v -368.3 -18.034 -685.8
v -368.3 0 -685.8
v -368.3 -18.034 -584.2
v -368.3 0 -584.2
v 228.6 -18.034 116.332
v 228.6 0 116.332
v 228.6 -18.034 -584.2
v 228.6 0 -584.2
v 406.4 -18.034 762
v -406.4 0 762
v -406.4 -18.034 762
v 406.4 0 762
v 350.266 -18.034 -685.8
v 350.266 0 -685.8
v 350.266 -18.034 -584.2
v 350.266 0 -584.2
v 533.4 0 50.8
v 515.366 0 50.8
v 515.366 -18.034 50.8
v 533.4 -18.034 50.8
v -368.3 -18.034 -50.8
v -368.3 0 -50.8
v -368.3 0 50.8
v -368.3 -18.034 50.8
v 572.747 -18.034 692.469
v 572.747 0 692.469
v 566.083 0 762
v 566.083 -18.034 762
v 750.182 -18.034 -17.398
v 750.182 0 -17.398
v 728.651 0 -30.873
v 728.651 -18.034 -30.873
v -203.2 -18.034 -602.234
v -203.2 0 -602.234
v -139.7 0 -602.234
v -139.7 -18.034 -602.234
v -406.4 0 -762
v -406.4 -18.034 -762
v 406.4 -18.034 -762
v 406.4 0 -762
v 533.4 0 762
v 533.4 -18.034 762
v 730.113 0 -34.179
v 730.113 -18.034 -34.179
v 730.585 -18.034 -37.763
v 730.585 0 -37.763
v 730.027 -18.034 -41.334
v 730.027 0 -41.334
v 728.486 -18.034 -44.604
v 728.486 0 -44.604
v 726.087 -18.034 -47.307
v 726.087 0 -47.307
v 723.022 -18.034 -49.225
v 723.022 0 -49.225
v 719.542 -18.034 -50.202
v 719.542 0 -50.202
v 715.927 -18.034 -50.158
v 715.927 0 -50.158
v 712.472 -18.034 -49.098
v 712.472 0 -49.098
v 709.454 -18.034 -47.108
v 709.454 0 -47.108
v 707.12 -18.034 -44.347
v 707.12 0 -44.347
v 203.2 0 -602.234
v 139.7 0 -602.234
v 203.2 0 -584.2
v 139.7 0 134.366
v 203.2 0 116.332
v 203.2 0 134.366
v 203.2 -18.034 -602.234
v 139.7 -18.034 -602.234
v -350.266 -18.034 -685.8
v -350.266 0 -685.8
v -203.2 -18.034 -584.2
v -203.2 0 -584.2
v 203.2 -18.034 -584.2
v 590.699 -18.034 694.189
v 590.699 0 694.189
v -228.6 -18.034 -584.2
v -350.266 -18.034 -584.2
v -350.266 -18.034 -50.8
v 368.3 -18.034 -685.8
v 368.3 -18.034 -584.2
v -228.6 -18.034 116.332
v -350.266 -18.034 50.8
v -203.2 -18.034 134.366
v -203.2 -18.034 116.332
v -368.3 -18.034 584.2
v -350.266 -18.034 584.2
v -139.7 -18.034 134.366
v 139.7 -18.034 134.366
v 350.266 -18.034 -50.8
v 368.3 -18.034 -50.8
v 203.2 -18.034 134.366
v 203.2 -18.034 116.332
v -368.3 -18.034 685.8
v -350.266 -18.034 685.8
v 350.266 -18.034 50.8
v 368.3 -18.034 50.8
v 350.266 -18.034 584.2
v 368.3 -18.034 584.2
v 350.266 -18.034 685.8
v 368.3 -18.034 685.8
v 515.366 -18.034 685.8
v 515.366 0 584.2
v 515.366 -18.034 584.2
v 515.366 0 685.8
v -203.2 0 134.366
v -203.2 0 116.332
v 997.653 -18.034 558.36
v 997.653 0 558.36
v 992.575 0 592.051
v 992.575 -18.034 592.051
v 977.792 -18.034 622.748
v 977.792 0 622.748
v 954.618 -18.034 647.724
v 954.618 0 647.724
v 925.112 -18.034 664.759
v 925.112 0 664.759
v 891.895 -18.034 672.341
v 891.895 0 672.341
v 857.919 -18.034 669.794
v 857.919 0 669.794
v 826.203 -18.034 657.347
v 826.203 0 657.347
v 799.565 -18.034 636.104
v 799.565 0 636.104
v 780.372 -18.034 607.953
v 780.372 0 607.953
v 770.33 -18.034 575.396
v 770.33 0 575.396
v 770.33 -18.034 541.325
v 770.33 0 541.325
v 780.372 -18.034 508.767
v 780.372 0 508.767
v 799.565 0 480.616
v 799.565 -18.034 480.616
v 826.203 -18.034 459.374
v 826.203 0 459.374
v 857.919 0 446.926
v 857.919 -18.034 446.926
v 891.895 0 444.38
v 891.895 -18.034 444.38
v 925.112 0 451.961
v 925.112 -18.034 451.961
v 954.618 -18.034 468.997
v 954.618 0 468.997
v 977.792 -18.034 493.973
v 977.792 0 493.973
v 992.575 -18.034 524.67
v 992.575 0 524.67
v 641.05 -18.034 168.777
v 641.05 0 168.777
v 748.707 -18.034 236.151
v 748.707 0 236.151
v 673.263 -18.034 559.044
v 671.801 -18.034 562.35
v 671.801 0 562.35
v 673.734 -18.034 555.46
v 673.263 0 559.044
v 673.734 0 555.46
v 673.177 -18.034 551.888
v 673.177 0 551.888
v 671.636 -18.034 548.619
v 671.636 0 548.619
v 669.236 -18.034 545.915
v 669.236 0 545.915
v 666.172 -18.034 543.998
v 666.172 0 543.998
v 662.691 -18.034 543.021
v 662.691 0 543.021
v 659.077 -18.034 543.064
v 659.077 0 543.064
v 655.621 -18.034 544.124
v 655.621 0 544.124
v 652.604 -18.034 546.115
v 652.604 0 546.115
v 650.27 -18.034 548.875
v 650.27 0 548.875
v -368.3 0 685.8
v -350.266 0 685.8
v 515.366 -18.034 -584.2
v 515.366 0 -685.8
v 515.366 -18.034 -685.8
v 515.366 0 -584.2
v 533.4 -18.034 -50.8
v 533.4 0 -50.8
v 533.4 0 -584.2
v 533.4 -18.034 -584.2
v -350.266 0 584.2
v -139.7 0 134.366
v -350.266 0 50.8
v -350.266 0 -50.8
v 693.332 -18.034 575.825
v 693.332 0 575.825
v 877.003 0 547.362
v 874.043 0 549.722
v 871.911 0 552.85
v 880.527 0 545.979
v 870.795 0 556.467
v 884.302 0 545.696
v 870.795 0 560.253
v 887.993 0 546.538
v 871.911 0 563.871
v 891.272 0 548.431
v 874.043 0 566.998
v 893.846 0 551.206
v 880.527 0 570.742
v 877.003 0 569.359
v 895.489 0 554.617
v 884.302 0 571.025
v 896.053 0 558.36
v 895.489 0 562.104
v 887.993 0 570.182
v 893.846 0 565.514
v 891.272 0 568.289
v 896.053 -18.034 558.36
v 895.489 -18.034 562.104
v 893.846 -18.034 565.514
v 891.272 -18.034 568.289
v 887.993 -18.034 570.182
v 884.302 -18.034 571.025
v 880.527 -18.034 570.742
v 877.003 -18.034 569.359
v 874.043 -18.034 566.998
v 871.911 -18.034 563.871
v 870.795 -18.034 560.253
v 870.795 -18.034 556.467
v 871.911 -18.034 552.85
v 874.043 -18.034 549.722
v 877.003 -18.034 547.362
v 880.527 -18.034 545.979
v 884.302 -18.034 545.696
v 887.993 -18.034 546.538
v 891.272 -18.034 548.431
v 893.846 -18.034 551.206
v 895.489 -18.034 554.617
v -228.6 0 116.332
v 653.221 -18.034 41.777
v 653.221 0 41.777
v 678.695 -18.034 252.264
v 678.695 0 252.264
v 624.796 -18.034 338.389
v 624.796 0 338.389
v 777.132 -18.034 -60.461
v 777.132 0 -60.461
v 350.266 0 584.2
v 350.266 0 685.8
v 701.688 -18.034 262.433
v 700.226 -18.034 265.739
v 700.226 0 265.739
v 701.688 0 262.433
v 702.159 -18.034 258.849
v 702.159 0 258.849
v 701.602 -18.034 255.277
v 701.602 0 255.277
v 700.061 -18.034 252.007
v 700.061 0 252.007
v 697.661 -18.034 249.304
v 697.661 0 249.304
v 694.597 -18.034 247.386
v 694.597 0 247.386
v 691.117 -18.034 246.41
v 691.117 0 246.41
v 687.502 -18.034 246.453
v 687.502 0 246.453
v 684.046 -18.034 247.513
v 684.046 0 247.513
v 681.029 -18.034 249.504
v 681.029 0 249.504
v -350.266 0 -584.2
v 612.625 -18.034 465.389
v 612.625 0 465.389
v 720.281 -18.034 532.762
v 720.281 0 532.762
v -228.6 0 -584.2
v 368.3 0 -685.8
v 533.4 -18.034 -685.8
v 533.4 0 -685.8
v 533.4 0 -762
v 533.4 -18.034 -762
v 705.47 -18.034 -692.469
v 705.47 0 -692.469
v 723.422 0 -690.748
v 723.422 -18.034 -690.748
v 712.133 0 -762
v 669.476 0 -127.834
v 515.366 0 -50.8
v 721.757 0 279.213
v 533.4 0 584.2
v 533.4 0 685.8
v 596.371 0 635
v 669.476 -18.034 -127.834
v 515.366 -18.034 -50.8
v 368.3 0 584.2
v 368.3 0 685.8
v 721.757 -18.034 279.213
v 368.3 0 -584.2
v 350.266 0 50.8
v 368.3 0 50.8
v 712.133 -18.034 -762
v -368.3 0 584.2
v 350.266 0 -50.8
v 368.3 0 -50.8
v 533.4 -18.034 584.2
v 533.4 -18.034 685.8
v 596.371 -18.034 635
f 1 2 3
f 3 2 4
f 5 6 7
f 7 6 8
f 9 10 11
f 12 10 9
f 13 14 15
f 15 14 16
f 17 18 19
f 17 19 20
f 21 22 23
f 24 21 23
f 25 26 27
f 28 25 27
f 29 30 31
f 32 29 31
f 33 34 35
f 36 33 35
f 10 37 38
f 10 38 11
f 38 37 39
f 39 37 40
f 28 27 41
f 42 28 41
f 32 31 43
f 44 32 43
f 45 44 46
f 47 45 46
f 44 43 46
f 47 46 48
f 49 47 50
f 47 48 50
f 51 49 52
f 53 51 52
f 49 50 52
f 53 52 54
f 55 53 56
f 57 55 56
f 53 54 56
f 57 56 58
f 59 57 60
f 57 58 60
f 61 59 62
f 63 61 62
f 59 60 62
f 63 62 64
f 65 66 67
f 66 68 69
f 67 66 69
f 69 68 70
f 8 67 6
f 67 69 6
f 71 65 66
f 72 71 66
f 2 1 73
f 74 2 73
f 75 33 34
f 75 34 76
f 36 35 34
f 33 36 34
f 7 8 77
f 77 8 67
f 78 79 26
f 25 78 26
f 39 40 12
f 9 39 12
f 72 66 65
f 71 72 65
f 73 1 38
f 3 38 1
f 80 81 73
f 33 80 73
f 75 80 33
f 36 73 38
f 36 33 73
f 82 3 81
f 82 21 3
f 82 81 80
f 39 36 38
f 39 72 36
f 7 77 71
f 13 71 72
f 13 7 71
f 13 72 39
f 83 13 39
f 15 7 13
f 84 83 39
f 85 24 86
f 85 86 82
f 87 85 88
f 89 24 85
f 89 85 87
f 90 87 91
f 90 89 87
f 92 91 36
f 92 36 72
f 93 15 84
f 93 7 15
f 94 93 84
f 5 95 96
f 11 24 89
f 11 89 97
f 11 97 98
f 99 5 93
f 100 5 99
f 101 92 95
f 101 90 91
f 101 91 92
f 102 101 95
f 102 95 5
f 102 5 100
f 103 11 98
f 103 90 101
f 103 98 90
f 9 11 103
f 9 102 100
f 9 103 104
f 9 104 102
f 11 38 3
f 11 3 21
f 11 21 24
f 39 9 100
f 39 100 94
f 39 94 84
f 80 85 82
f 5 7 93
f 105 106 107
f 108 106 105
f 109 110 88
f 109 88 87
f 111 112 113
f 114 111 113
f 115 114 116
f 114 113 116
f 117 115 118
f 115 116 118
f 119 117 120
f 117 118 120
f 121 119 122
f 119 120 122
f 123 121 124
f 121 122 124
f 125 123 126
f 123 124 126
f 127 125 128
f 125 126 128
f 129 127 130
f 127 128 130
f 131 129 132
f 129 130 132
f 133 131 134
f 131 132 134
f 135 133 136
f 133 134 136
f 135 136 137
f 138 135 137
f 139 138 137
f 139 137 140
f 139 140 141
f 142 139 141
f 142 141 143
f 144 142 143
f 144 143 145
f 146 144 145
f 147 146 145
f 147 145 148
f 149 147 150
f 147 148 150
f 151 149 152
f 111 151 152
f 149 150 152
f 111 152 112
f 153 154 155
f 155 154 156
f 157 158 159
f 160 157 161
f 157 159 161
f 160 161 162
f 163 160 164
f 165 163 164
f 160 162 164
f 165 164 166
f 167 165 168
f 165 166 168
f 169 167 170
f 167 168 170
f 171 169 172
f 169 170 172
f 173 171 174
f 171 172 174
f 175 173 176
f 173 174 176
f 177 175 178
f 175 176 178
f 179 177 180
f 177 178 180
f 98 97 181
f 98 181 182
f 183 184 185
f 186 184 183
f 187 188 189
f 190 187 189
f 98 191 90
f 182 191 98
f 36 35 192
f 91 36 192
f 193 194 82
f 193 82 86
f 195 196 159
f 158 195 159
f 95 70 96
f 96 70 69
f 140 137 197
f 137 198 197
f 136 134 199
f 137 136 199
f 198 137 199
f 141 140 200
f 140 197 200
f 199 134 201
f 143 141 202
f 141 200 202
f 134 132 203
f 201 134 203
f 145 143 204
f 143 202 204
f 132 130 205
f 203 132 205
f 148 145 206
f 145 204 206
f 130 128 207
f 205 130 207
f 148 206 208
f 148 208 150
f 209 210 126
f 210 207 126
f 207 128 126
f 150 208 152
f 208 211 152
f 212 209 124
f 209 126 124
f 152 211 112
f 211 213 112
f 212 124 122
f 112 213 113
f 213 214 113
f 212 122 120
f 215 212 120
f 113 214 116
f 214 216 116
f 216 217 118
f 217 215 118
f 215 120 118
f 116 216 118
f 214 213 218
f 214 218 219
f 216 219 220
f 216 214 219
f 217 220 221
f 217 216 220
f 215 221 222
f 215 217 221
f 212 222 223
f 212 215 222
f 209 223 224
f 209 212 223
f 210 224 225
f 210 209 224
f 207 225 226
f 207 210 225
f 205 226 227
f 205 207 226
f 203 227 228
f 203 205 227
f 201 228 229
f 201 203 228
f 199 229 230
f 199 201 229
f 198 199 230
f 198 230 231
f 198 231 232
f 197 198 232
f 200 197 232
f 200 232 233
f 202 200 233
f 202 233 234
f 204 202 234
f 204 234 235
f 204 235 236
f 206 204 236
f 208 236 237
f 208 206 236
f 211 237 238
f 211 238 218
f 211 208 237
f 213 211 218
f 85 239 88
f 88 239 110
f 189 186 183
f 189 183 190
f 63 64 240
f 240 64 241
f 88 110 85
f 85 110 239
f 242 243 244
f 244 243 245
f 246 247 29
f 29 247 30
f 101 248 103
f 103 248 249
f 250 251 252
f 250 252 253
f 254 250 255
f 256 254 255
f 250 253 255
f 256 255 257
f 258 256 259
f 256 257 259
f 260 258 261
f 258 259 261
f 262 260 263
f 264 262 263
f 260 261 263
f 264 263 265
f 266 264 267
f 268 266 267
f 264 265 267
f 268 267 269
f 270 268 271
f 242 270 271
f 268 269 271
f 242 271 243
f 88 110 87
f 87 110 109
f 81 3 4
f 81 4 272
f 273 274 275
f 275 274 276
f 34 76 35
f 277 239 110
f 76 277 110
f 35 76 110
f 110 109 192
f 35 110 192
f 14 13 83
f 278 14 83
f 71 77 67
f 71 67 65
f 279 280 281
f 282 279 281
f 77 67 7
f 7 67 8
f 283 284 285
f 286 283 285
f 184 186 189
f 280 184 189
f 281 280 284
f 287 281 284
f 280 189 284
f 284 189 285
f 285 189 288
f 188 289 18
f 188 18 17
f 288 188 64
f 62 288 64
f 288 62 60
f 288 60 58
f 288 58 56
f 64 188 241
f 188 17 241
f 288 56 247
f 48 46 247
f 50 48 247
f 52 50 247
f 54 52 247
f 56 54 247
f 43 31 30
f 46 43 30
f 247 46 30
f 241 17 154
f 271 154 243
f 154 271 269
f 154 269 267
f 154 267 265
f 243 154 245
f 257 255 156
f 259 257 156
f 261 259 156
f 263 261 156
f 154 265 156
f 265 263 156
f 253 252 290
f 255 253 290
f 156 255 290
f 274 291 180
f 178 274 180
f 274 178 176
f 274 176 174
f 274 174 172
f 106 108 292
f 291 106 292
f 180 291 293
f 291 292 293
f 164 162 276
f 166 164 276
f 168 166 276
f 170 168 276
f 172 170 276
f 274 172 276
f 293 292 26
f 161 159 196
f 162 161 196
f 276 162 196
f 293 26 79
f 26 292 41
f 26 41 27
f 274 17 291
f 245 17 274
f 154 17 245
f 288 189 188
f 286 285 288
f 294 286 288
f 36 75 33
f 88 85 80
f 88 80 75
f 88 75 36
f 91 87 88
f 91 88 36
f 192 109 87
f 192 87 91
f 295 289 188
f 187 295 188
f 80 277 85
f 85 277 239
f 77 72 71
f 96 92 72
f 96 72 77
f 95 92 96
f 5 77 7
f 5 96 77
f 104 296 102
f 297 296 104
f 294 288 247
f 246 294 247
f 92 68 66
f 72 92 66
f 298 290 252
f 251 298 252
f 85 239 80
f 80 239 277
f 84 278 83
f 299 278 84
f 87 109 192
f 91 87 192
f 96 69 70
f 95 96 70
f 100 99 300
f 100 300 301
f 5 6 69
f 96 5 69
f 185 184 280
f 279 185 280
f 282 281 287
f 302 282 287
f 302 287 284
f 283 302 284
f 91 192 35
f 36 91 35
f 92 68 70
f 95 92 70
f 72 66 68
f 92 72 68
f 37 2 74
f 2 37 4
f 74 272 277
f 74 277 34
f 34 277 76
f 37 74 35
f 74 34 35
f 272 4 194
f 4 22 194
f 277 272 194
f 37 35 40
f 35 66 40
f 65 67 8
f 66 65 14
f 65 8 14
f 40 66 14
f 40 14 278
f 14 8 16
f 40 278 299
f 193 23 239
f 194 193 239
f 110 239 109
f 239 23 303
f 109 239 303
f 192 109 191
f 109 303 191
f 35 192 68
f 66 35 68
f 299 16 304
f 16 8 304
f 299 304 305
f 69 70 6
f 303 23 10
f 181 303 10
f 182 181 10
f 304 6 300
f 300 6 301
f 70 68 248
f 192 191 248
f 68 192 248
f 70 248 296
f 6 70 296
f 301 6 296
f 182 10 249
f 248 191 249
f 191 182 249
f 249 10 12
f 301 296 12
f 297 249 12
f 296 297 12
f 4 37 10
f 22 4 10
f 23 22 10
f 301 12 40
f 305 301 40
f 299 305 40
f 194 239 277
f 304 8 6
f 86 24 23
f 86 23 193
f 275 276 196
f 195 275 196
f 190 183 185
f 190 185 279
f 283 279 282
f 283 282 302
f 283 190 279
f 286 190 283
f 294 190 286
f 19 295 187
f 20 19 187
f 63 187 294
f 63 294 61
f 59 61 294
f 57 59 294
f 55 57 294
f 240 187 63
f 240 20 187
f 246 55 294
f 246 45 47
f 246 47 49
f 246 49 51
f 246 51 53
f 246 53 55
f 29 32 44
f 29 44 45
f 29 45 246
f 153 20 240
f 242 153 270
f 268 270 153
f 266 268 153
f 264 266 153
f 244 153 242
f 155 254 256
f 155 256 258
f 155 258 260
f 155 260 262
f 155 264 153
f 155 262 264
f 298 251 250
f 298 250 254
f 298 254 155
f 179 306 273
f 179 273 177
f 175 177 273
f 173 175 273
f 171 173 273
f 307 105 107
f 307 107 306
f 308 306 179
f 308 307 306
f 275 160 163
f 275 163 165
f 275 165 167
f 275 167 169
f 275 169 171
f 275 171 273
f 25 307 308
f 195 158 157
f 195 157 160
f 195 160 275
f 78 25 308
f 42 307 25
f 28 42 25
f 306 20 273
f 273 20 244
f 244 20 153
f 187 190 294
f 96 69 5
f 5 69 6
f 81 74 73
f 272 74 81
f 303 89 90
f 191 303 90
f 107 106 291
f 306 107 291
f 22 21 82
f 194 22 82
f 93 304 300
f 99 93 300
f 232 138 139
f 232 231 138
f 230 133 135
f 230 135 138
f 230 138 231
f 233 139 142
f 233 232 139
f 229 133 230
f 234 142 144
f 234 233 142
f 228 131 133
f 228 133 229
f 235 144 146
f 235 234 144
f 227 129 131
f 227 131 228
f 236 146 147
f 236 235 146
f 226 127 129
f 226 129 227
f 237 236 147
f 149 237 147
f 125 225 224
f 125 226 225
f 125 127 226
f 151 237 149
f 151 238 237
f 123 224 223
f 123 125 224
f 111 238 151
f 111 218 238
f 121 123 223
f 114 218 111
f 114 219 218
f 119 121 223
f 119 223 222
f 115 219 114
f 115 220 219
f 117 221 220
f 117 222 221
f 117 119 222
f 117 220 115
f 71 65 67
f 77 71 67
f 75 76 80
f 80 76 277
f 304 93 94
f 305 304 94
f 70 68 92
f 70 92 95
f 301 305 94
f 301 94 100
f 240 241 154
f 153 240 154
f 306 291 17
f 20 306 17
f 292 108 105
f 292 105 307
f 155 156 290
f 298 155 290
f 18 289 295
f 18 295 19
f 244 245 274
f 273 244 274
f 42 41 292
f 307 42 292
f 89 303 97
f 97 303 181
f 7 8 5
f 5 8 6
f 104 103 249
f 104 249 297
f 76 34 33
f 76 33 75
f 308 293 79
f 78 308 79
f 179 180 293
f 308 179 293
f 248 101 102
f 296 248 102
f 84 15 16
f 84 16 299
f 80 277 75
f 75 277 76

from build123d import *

# Parameters (mm, degrees)
F1_W     = 812.8
F1_H     = 1524
F1_W_2   = 18.034
F1_H_2   = 101.6
F2_DEPTH = 18.034
F1_R     = 114.3
F1_R_2   = 12.7
F1_W_3   = 63.5
F1_H_3   = 18.034
F3_DEPTH = 18.034


# Not quite as in the source:
# - a variable given as a bare number and used for a length is read in inches; the dataset says mm whatever the document's units were


with BuildPart() as f2:
    # F1 (on Front) → F2 (new body)
    with BuildSketch(Plane.XZ):
        Rectangle(F1_W, F1_H)
        with Locations((-359.283, -635)):
            Rectangle(F1_W_2, F1_H_2, mode=Mode.SUBTRACT)
        Polygon((-203.2, -584.2), (-228.6, -584.2), (-228.6, 116.332), (-203.2, 116.332), (-203.2, 134.366), (-139.7, 134.366), (-139.7, 116.332), (-139.7, -584.2), (-139.7, -602.234), (-203.2, -602.234), align=None, mode=Mode.SUBTRACT)
        Polygon((139.7, -602.234), (139.7, -584.2), (139.7, 116.332), (139.7, 134.366), (203.2, 134.366), (203.2, 116.332), (228.6, 116.332), (228.6, -584.2), (203.2, -584.2), (203.2, -602.234), align=None, mode=Mode.SUBTRACT)
        with Locations((359.283, -635)):
            Rectangle(F1_W_2, F1_H_2, mode=Mode.SUBTRACT)
        with Locations((-359.283, 0)):
            Rectangle(F1_W_2, F1_H_2, mode=Mode.SUBTRACT)
        with Locations((-359.283, 635)):
            Rectangle(F1_W_2, F1_H_2, mode=Mode.SUBTRACT)
        with Locations((359.283, 0)):
            Rectangle(F1_W_2, F1_H_2, mode=Mode.SUBTRACT)
        with Locations((359.283, 635)):
            Rectangle(F1_W_2, F1_H_2, mode=Mode.SUBTRACT)
    extrude(amount=F2_DEPTH)


with BuildPart() as f2b:
    # F1 (on Front) → F2, piece 2 (new body)
    with BuildSketch(Plane.XZ):
        with Locations((524.383, -635)):
            Rectangle(F1_W_2, F1_H_2)
        with Locations((524.383, 0)):
            Rectangle(F1_W_2, F1_H_2)
        with Locations((524.383, 635)):
            Rectangle(F1_W_2, F1_H_2)
        Polygon((650.269536136, 548.8751497174), (596.3708333333, 635), (607.2071109947, 521.9257983161), align=None)
        with BuildLine():
            Line((650.269536136, 548.8751497174), (607.2071109947, 521.9257983161))
            Line((607.2071109947, 521.9257983161), (612.6252498254, 465.3886974742))
            Line((612.6252498254, 465.3886974742), (720.2813126786, 532.7620759775))
            Line((720.2813126786, 532.7620759775), (693.3319612773, 575.8245011188))
            Line((693.3319612773, 575.8245011188), (671.8007487066, 562.3498254181))
            ThreePointArc((671.8007487066, 562.3498254181), (667.7724802716, 544.8468812825), (650.269536136, 548.8751497174))
        make_face()
        Polygon((678.6947859614, 252.2638471916), (624.7960831587, 338.3886974742), (635.6323608201, 225.3144957903), align=None)
        with BuildLine():
            Line((678.6947859614, 252.2638471916), (635.6323608201, 225.3144957903))
            Line((635.6323608201, 225.3144957903), (641.0504996508, 168.7773949484))
            Line((641.0504996508, 168.7773949484), (748.706562504, 236.1507734517))
            Line((748.706562504, 236.1507734517), (721.7572111026, 279.213198593))
            Line((721.7572111026, 279.213198593), (700.225998532, 265.7385228923))
            ThreePointArc((700.225998532, 265.7385228923), (696.197730097, 248.2355787566), (678.6947859614, 252.2638471916))
        make_face()
        Polygon((707.1200357868, -44.3474553342), (653.2213329841, 41.7773949484), (664.0576106455, -71.2968067355), align=None)
        with BuildLine():
            Line((664.0576106455, -71.2968067355), (669.4757494762, -127.8339075774))
            Line((669.4757494762, -127.8339075774), (777.1318123294, -60.4605290741))
            Line((777.1318123294, -60.4605290741), (750.182460928, -17.3981039329))
            Line((750.182460928, -17.3981039329), (728.6512483574, -30.8727796335))
            ThreePointArc((728.6512483574, -30.8727796335), (724.6229799224, -48.3757237692), (707.1200357868, -44.3474553342))
            Line((707.1200357868, -44.3474553342), (664.0576106455, -71.2968067355))
        make_face()
        Polygon((566.0833768912, 762), (533.4, 762), (533.4, 685.8), (533.4, 584.2), (533.4, 50.8), (533.4, -50.8), (533.4, -584.2), (533.4, -685.8), (533.4, -762), (712.1333768912, -762), (705.4699471859, -692.4685595967), (723.42170089, -690.7481832), (669.4757494762, -127.8339075774), (664.0576106455, -71.2968067355), (653.2213329841, 41.7773949484), (641.0504996508, 168.7773949484), (635.6323608201, 225.3144957903), (624.7960831587, 338.3886974742), (612.6252498254, 465.3886974742), (607.2071109947, 521.9257983161), (596.3708333333, 635), (590.6985603006, 694.1889359933), (572.7468065965, 692.4685595967), align=None)
    extrude(amount=F2_DEPTH)


with BuildPart() as f2c:
    # F1 (on Front) → F2, piece 3 (new body)
    with BuildSketch(Plane.XZ):
        with Locations((883.3532333374, 558.3602190018)):
            Circle(F1_R)
        with Locations((883.3532333374, 558.3602190018)):
            Circle(F1_R_2, mode=Mode.SUBTRACT)
    extrude(amount=F2_DEPTH)


with BuildPart() as f3:
    # F1 (on Front) → F3 (new body)
    with BuildSketch(Plane.XZ):
        Polygon((-228.6, 116.332), (-228.6, -584.2), (-203.2, -584.2), (-139.7, -584.2), (-139.7, 116.332), (-203.2, 116.332), align=None)
        with Locations((-171.45, 125.349)):
            Rectangle(F1_W_3, F1_H_3)
        with Locations((-171.45, -593.217)):
            Rectangle(F1_W_3, F1_H_3)
    extrude(amount=F3_DEPTH)


with BuildPart() as f3b:
    # F1 (on Front) → F3, piece 2 (new body)
    with BuildSketch(Plane.XZ):
        with Locations((171.45, 125.349)):
            Rectangle(F1_W_3, F1_H_3)
        Polygon((139.7, 116.332), (139.7, -584.2), (203.2, -584.2), (228.6, -584.2), (228.6, 116.332), (203.2, 116.332), align=None)
        with Locations((171.45, -593.217)):
            Rectangle(F1_W_3, F1_H_3)
    extrude(amount=F3_DEPTH)


solid = Compound([f2.part, f2b.part, f2c.part, f3.part, f3b.part])
